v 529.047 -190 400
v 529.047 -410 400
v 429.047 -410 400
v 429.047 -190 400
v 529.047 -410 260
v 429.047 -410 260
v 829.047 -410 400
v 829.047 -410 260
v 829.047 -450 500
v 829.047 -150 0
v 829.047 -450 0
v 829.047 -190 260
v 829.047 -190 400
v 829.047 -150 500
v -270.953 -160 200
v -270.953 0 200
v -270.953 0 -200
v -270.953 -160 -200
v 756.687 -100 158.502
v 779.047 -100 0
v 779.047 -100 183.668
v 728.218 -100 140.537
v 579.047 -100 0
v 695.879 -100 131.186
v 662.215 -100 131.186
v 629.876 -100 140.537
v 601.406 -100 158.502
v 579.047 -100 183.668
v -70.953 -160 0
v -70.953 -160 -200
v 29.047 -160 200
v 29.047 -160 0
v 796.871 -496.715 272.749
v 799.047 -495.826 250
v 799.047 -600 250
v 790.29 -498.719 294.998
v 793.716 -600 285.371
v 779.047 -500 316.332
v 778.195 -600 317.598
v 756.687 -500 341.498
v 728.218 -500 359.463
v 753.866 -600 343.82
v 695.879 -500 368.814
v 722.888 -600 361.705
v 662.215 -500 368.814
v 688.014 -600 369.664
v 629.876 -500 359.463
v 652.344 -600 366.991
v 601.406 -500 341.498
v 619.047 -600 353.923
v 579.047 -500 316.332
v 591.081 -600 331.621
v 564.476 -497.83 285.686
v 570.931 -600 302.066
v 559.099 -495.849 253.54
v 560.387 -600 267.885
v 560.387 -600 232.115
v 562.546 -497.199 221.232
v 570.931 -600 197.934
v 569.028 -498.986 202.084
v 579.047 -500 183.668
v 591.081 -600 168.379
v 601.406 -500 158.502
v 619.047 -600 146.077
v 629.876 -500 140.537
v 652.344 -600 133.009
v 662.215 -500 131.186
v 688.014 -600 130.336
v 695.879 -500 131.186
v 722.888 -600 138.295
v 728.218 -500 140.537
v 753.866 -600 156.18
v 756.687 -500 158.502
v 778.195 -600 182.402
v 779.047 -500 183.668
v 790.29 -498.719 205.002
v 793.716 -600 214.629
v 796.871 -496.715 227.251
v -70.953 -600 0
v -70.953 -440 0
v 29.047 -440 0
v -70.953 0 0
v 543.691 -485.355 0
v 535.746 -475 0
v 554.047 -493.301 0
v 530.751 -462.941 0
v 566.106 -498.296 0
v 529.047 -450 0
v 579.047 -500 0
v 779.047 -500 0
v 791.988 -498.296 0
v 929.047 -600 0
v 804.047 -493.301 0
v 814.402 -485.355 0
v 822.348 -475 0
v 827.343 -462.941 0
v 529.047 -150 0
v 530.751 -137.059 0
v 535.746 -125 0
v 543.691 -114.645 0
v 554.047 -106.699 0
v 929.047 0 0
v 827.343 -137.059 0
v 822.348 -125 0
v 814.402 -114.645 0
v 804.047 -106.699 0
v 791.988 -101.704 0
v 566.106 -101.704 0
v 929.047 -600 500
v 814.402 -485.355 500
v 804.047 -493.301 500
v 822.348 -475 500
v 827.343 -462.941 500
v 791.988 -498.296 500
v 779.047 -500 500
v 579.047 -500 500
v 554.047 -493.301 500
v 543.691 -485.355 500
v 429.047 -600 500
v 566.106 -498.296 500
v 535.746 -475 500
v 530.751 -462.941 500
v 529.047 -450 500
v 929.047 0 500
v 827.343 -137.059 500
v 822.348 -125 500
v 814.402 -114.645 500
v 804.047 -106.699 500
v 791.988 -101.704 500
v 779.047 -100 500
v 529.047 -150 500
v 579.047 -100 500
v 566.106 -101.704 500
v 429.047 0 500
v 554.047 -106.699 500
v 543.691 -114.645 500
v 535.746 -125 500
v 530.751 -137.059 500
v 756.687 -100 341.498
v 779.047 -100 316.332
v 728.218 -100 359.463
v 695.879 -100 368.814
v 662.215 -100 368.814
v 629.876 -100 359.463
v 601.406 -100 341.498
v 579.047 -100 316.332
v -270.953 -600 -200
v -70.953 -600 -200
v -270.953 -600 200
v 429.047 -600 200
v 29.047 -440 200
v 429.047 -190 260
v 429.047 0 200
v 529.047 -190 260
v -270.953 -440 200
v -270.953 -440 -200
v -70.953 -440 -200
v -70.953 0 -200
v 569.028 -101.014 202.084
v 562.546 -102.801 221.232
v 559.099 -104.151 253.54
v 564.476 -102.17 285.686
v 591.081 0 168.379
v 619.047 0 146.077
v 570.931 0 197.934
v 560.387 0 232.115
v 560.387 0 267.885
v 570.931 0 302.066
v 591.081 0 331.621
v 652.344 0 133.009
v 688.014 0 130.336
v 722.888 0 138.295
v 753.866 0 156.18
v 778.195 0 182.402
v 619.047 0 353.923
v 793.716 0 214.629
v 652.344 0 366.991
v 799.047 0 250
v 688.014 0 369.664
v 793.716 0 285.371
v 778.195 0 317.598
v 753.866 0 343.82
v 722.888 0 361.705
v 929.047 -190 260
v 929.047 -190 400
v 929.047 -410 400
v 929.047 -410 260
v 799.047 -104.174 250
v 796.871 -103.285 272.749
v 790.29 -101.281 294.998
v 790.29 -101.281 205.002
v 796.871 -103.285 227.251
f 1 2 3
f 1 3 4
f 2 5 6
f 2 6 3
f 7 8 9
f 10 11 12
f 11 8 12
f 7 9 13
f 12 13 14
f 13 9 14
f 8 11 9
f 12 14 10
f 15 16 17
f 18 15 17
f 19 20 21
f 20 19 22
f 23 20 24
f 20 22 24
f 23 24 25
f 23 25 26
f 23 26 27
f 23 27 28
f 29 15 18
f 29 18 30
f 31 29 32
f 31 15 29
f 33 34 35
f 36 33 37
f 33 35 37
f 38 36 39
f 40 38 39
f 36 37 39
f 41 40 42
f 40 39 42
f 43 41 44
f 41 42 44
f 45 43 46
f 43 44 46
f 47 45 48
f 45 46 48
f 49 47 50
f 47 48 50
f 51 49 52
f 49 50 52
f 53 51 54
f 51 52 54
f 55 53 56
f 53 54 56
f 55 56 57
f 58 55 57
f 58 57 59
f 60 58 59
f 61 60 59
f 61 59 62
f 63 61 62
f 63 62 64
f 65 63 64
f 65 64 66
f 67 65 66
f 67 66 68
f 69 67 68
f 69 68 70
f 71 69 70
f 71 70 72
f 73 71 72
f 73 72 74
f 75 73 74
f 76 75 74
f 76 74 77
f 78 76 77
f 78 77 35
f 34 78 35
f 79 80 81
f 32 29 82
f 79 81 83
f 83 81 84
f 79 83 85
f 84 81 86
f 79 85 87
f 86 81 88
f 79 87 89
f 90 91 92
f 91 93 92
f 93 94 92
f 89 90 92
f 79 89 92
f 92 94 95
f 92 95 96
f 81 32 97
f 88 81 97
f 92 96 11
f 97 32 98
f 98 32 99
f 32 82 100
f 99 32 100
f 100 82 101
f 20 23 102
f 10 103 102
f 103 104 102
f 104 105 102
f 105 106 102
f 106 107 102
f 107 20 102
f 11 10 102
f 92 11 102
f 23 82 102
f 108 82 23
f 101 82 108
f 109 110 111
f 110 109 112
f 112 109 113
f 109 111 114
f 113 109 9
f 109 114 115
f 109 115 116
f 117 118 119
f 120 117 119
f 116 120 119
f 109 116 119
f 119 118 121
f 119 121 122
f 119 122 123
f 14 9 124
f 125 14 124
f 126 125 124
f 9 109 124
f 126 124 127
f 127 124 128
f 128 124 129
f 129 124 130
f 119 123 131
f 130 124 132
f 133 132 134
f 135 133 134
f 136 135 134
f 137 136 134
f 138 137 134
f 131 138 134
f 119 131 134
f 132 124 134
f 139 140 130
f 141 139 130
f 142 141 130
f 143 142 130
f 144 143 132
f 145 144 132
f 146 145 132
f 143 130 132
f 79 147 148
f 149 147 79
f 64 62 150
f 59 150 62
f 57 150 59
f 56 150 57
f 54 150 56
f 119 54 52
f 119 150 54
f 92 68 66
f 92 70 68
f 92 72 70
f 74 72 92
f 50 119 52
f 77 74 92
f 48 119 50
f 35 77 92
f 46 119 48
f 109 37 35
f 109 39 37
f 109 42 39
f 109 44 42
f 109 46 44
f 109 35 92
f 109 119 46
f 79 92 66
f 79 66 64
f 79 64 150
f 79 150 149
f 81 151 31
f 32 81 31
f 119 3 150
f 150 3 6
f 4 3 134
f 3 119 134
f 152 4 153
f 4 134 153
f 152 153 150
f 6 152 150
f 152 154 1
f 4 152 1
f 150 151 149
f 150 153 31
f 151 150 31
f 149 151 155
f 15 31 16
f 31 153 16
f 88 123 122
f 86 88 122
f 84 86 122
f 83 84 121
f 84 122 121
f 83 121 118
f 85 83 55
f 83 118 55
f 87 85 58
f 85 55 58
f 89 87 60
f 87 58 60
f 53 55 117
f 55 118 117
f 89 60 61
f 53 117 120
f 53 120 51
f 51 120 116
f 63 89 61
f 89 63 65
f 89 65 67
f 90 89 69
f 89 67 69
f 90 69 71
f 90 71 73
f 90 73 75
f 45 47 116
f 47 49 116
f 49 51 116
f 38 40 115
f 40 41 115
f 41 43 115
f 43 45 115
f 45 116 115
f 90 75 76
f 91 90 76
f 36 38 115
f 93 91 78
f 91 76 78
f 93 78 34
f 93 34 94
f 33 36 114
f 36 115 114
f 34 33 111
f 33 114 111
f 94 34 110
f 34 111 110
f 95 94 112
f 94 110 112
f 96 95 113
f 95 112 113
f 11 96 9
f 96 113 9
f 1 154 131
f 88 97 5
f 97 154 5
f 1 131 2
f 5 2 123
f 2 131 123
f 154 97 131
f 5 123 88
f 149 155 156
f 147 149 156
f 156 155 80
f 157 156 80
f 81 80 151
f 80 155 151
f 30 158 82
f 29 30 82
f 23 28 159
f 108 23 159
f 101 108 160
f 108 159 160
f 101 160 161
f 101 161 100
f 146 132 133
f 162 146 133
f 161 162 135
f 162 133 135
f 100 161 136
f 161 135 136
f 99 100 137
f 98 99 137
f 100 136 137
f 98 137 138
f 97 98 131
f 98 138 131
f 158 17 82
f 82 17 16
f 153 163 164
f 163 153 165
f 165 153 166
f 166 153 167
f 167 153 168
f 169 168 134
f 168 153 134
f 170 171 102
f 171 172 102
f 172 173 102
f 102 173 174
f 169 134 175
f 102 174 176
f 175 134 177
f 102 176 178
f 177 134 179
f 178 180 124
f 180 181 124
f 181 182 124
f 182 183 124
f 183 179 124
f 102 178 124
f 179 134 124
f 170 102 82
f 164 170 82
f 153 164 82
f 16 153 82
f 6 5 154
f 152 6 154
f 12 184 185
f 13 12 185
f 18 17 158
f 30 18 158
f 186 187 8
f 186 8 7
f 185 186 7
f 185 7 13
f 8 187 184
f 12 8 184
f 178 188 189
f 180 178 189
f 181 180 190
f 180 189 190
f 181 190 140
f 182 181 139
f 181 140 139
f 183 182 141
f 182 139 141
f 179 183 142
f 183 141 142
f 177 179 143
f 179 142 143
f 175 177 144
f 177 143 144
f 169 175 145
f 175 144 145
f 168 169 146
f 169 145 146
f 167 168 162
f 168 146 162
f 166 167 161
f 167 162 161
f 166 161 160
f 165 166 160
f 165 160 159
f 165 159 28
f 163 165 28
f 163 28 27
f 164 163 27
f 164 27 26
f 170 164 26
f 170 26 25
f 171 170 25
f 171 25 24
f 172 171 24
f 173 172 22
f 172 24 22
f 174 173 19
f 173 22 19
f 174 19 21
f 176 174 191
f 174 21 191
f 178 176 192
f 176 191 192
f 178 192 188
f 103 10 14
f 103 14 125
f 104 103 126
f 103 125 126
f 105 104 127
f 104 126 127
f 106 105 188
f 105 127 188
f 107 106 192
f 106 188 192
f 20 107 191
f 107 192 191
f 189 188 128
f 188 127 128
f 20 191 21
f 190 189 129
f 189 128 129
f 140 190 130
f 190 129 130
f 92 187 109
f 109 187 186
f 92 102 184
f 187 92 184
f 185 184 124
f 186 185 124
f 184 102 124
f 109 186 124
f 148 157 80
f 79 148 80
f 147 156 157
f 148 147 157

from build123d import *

# Parameters (mm, degrees)
F1_DEPTH = 600
F2_W     = 600
F2_H     = 280
F3_DEPTH = 400.001
F5_DEPTH = 700.001
F6_R     = 120
F7_DEPTH = 600.001
F8_W     = 220
F8_H     = 140
F9_DEPTH = 1200.001


with BuildPart() as f1:
    # F0 (on Front) → F1 (new body)
    with BuildSketch(Plane.XZ):
        Polygon((-70.953188, 0), (0, 0), (929.046812, 0), (929.046812, 500), (429.046812, 500), (429.046812, 200), (-270.953188, 200), (-270.953188, -200), (-70.953188, -200), align=None)
    extrude(amount=F1_DEPTH)

    # F2 (on face) → F3 (cut, through all)
    with BuildSketch(Plane.XY.offset(200)):
        with Locations((-270.953188, -300)):
            Rectangle(F2_W, F2_H)
    extrude(amount=-F3_DEPTH, mode=Mode.SUBTRACT)

    # F4 (on face) → F5 (cut, through all)
    with BuildSketch(Plane.XY.offset(500)):
        with BuildLine():
            ThreePointArc((529.046812, -450), (543.691473, -485.355339), (579.046812, -500))
            Line((579.046812, -500), (779.046812, -500))
            ThreePointArc((779.046812, -500), (814.402152, -485.355339), (829.046812, -450))
            Line((829.046812, -450), (829.046812, -150))
            ThreePointArc((829.046812, -150), (814.402152, -114.644661), (779.046812, -100))
            Line((779.046812, -100), (579.046812, -100))
            ThreePointArc((579.046812, -100), (543.691473, -114.644661), (529.046812, -150))
            Line((529.046812, -150), (529.046812, -450))
        make_face()
    extrude(amount=-F5_DEPTH, mode=Mode.SUBTRACT)

    # F6 (on face) → F7 (cut, through all)
    with BuildSketch(Plane.XZ.offset(600)):
        with Locations((679.046812, 250)):
            Circle(F6_R)
    extrude(amount=-F7_DEPTH, mode=Mode.SUBTRACT)

    # F8 (on face) → F9 (cut, through all)
    with BuildSketch(Plane.YZ.offset(929.046812)):
        with Locations((-300, 330)):
            Rectangle(F8_W, F8_H)
    extrude(amount=-F9_DEPTH, mode=Mode.SUBTRACT)


solid = f1.part
